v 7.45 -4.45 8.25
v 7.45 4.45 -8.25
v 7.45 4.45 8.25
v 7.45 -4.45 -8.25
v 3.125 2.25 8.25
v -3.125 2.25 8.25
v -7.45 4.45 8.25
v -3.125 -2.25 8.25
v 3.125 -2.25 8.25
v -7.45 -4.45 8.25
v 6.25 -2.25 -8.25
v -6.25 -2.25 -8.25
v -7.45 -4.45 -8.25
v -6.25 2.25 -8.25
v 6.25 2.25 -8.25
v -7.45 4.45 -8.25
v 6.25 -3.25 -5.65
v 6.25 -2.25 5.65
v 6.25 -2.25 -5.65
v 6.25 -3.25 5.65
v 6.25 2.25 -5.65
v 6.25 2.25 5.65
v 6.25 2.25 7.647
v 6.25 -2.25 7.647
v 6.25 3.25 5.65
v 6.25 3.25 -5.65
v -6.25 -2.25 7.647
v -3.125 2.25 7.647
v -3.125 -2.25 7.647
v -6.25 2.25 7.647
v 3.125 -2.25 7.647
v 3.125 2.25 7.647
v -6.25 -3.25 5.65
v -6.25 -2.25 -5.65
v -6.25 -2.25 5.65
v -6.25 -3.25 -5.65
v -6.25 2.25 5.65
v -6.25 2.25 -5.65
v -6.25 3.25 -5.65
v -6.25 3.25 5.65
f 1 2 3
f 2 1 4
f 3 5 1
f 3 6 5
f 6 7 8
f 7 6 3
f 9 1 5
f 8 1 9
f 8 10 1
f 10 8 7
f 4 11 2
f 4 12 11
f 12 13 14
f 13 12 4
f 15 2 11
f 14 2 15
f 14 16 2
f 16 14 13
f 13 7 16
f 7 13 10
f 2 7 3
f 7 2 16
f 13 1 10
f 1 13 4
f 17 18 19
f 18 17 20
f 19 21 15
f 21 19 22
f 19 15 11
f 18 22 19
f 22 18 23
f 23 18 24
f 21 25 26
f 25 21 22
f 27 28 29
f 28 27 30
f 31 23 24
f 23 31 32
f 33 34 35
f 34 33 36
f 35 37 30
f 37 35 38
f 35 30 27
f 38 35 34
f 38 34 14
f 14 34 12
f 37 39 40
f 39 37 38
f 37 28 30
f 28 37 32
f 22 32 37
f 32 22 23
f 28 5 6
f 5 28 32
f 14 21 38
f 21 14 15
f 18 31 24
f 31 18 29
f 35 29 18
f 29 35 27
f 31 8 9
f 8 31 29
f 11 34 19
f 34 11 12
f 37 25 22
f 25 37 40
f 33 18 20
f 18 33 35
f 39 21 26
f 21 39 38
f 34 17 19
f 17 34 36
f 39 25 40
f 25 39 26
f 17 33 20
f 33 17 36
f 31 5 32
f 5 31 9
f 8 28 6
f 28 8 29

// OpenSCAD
// file: ../modules/hexagon.scad
module hexagon(r = 1) {
  polygon([
    [-1 * r, 0],
    [-.5 * r, r * sqrt(3) / 2],
    [.5 * r, r * sqrt(3) / 2],
    [1 * r, 0],
    [.5 * r, r * sqrt(3) / -2],
    [-.5 * r, r * sqrt(3) / -2],
  ]);
}
// file: ../modules/breakPart.scad
module rotFromTo(di,do)
    if( norm(di-do)==0 || norm(di)==0 || norm(do)==0 )
        children();
    else
        mirror(do/norm(do)+di/norm(di)) mirror(di) children(); 

module breakPart(normal = [0, 0, 0], shift=0, pinLocs = [[0, 0]], pinType = 0) {
  // First child is the part itself, second child is the pin
  //   - The pin should be centered in x and y and into the positive z direction
  // normal: Vector normal to the plane of breaking
  // shift: How far from the origin to move the center of the plane
  // pinOffset: Offset for pin (hole -> wider, pin -> narrower)
  // pinType: [0: attached (M), 1: F]
  _BIG = 250;

  difference() {
    children(0);
    rotFromTo([0, 0, 1], normal) translate([0, 0, shift]) {
      difference() {
        cylinder(r = _BIG/2, h = _BIG);
        if (pinType == 0) for (loc = pinLocs) {
          translate(concat(loc, [shift - eps])) {
            children(1);
          }
        }
      }
      if (pinType == 1) for (loc = pinLocs) {
        mirror([0, 0, 1]) translate(concat(loc, [shift - eps])) {
          children(1);
        }
      }
    } 
  }

}
// file: ../_constants.scad
include <modules/breakPart.scad>;
include <modules/hexagon.scad>;

$fa=1 + 0; // default minimum facet angle is now 0.5
$fs=0.01 + 0; // default minimum facet size is now 0.05 mm
eps = .005 + 0;
tol = .1;

defaultFont = "Bitstream Vera Sans Mono:style=Bold";
// main file
include <../_constants.scad>

l = 12.5;
w = 4.5;
h = 16.5;

extra = 2;

tw = 1.2;

difference() {
  cube([l + tw*2, w + tw*2 + extra, h], center=true);
  translate([0, 0, -tw/2 - eps]) cube([l, w, h + eps], center = true);
  translate([0, 0, 0]) cube([l, w + extra, h - extra*2 - tw], center = true);
  translate([0, 0, h/2]) cube([l / 2, w, tw + eps*2], center=true);
}
